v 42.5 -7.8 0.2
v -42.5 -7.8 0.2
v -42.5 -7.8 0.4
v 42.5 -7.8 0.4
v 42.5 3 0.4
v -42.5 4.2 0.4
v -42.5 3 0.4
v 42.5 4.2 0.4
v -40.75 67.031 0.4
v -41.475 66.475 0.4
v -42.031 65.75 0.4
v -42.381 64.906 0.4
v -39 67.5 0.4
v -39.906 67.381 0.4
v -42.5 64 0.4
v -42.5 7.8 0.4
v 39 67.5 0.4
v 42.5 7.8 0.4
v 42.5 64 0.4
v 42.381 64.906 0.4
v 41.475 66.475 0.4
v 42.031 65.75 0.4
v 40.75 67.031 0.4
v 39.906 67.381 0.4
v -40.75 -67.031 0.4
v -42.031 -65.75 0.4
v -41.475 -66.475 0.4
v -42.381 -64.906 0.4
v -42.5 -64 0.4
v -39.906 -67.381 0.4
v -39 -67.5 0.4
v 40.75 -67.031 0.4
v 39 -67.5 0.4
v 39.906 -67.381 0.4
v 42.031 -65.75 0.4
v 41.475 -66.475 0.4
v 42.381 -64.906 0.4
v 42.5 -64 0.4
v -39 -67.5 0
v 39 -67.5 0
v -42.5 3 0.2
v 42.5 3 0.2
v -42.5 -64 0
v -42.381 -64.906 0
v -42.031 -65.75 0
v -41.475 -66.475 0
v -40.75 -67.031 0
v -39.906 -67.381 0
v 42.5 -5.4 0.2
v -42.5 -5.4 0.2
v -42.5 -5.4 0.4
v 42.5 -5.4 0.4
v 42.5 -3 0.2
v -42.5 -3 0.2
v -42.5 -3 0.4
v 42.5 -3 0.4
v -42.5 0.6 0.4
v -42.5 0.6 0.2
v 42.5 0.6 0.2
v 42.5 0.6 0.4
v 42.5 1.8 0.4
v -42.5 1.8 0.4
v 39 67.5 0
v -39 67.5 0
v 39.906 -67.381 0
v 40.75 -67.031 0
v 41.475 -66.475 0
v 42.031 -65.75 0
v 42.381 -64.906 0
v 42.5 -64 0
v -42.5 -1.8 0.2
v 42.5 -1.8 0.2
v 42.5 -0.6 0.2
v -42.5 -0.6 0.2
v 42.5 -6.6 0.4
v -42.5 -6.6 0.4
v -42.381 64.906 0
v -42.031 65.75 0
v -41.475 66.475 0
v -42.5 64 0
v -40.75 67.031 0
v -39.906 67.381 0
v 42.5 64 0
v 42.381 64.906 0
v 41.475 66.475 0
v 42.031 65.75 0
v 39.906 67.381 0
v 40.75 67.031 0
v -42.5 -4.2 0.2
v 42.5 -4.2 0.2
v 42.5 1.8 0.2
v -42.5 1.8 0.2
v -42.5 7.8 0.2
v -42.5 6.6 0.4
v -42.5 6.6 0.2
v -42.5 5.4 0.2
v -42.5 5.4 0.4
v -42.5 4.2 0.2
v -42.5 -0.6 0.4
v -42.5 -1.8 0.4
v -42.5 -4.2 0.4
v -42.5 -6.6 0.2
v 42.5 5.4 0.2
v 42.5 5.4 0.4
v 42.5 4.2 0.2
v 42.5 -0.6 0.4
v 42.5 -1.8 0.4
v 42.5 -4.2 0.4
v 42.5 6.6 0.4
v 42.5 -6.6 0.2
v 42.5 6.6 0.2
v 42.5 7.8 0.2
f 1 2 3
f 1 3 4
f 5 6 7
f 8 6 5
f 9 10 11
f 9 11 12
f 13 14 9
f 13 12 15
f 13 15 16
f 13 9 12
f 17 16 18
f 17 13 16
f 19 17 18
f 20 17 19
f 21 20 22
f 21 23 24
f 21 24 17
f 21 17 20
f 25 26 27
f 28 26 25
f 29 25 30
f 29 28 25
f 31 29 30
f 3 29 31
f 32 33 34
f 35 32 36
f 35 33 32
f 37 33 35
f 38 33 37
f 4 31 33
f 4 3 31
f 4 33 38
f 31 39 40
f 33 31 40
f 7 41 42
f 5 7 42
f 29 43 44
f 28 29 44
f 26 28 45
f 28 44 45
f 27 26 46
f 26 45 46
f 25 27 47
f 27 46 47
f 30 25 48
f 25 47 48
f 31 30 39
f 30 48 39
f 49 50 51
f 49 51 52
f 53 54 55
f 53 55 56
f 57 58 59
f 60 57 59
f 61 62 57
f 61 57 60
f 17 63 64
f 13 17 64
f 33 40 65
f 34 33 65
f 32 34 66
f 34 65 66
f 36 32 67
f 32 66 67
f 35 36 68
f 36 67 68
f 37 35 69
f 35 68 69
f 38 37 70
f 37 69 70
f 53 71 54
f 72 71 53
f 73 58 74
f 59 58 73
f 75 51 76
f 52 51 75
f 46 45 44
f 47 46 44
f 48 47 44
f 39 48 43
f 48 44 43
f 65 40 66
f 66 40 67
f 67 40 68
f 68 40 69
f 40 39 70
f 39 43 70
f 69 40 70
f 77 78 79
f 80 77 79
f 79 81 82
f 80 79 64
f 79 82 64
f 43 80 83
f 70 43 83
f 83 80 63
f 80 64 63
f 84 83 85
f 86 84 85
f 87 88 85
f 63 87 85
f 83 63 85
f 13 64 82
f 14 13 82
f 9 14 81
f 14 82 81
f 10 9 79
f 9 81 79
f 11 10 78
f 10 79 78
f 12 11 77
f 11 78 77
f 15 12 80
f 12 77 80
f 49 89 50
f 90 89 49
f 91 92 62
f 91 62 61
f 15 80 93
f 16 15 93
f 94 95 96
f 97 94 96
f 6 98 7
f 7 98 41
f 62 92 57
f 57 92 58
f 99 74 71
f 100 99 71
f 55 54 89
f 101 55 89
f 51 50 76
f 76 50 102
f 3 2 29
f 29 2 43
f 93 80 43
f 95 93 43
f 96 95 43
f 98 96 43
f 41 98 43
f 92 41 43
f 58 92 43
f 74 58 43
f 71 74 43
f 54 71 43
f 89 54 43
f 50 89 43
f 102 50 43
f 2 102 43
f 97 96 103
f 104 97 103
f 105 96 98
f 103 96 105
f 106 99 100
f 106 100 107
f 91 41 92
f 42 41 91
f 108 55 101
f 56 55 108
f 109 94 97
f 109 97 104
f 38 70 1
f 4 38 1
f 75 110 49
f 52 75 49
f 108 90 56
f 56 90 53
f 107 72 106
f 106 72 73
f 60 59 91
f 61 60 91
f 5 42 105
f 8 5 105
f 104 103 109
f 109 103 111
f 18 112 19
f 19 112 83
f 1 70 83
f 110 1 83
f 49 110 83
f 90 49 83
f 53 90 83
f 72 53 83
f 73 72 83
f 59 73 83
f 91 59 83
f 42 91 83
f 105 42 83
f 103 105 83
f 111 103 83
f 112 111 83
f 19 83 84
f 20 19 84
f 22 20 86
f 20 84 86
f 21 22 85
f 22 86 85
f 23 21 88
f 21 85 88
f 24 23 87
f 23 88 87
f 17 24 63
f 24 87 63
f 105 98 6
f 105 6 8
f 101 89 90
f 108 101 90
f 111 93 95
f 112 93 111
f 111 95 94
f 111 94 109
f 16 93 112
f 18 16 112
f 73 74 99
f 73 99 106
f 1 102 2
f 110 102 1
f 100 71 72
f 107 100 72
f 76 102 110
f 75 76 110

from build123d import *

# Parameters (mm, degrees)
F1_DEPTH = 0.2
F3_DEPTH = 0.4
F2_W     = 85
F2_H     = 1.2
F4_DEPTH = 0.2


with BuildPart() as f1:
    # F0 (on Top) → F1 (new body)
    with BuildSketch(Plane.XY):
        with BuildLine():
            ThreePointArc((42.5, 64), (41.474874, 66.474874), (39, 67.5))
            Line((39, 67.5), (-39, 67.5))
            ThreePointArc((-39, 67.5), (-41.474874, 66.474874), (-42.5, 64))
            Line((-42.5, 64), (-42.5, -64))
            ThreePointArc((-42.5, -64), (-41.474874, -66.474874), (-39, -67.5))
            Line((-39, -67.5), (39, -67.5))
            ThreePointArc((39, -67.5), (41.474874, -66.474874), (42.5, -64))
            Line((42.5, -64), (42.5, 64))
        make_face()
    extrude(amount=F1_DEPTH)

    # F0 (on Top) → F3 (join)
    with BuildSketch(Plane.XY):
        with BuildLine():
            ThreePointArc((42.5, 64), (41.474874, 66.474874), (39, 67.5))
            Line((39, 67.5), (-39, 67.5))
            ThreePointArc((-39, 67.5), (-41.474874, 66.474874), (-42.5, 64))
            Line((-42.5, 64), (-42.5, -64))
            ThreePointArc((-42.5, -64), (-41.474874, -66.474874), (-39, -67.5))
            Line((-39, -67.5), (39, -67.5))
            ThreePointArc((39, -67.5), (41.474874, -66.474874), (42.5, -64))
            Line((42.5, -64), (42.5, 64))
        make_face()
    extrude(amount=F3_DEPTH)

    # F2 (on face) → F4 (cut, through all)
    with BuildSketch(Plane.XY.offset(0.2)):
        Rectangle(F2_W, F2_H)
        with Locations((0, 2.4)):
            Rectangle(F2_W, F2_H)
        with Locations((0, 4.8)):
            Rectangle(F2_W, F2_H)
        with Locations((0, -2.4)):
            Rectangle(F2_W, F2_H)
        with Locations((0, -4.8)):
            Rectangle(F2_W, F2_H)
        with Locations((0, 7.2)):
            Rectangle(F2_W, F2_H)
        with Locations((0, -7.2)):
            Rectangle(F2_W, F2_H)
    extrude(amount=F4_DEPTH, mode=Mode.SUBTRACT)


solid = f1.part
